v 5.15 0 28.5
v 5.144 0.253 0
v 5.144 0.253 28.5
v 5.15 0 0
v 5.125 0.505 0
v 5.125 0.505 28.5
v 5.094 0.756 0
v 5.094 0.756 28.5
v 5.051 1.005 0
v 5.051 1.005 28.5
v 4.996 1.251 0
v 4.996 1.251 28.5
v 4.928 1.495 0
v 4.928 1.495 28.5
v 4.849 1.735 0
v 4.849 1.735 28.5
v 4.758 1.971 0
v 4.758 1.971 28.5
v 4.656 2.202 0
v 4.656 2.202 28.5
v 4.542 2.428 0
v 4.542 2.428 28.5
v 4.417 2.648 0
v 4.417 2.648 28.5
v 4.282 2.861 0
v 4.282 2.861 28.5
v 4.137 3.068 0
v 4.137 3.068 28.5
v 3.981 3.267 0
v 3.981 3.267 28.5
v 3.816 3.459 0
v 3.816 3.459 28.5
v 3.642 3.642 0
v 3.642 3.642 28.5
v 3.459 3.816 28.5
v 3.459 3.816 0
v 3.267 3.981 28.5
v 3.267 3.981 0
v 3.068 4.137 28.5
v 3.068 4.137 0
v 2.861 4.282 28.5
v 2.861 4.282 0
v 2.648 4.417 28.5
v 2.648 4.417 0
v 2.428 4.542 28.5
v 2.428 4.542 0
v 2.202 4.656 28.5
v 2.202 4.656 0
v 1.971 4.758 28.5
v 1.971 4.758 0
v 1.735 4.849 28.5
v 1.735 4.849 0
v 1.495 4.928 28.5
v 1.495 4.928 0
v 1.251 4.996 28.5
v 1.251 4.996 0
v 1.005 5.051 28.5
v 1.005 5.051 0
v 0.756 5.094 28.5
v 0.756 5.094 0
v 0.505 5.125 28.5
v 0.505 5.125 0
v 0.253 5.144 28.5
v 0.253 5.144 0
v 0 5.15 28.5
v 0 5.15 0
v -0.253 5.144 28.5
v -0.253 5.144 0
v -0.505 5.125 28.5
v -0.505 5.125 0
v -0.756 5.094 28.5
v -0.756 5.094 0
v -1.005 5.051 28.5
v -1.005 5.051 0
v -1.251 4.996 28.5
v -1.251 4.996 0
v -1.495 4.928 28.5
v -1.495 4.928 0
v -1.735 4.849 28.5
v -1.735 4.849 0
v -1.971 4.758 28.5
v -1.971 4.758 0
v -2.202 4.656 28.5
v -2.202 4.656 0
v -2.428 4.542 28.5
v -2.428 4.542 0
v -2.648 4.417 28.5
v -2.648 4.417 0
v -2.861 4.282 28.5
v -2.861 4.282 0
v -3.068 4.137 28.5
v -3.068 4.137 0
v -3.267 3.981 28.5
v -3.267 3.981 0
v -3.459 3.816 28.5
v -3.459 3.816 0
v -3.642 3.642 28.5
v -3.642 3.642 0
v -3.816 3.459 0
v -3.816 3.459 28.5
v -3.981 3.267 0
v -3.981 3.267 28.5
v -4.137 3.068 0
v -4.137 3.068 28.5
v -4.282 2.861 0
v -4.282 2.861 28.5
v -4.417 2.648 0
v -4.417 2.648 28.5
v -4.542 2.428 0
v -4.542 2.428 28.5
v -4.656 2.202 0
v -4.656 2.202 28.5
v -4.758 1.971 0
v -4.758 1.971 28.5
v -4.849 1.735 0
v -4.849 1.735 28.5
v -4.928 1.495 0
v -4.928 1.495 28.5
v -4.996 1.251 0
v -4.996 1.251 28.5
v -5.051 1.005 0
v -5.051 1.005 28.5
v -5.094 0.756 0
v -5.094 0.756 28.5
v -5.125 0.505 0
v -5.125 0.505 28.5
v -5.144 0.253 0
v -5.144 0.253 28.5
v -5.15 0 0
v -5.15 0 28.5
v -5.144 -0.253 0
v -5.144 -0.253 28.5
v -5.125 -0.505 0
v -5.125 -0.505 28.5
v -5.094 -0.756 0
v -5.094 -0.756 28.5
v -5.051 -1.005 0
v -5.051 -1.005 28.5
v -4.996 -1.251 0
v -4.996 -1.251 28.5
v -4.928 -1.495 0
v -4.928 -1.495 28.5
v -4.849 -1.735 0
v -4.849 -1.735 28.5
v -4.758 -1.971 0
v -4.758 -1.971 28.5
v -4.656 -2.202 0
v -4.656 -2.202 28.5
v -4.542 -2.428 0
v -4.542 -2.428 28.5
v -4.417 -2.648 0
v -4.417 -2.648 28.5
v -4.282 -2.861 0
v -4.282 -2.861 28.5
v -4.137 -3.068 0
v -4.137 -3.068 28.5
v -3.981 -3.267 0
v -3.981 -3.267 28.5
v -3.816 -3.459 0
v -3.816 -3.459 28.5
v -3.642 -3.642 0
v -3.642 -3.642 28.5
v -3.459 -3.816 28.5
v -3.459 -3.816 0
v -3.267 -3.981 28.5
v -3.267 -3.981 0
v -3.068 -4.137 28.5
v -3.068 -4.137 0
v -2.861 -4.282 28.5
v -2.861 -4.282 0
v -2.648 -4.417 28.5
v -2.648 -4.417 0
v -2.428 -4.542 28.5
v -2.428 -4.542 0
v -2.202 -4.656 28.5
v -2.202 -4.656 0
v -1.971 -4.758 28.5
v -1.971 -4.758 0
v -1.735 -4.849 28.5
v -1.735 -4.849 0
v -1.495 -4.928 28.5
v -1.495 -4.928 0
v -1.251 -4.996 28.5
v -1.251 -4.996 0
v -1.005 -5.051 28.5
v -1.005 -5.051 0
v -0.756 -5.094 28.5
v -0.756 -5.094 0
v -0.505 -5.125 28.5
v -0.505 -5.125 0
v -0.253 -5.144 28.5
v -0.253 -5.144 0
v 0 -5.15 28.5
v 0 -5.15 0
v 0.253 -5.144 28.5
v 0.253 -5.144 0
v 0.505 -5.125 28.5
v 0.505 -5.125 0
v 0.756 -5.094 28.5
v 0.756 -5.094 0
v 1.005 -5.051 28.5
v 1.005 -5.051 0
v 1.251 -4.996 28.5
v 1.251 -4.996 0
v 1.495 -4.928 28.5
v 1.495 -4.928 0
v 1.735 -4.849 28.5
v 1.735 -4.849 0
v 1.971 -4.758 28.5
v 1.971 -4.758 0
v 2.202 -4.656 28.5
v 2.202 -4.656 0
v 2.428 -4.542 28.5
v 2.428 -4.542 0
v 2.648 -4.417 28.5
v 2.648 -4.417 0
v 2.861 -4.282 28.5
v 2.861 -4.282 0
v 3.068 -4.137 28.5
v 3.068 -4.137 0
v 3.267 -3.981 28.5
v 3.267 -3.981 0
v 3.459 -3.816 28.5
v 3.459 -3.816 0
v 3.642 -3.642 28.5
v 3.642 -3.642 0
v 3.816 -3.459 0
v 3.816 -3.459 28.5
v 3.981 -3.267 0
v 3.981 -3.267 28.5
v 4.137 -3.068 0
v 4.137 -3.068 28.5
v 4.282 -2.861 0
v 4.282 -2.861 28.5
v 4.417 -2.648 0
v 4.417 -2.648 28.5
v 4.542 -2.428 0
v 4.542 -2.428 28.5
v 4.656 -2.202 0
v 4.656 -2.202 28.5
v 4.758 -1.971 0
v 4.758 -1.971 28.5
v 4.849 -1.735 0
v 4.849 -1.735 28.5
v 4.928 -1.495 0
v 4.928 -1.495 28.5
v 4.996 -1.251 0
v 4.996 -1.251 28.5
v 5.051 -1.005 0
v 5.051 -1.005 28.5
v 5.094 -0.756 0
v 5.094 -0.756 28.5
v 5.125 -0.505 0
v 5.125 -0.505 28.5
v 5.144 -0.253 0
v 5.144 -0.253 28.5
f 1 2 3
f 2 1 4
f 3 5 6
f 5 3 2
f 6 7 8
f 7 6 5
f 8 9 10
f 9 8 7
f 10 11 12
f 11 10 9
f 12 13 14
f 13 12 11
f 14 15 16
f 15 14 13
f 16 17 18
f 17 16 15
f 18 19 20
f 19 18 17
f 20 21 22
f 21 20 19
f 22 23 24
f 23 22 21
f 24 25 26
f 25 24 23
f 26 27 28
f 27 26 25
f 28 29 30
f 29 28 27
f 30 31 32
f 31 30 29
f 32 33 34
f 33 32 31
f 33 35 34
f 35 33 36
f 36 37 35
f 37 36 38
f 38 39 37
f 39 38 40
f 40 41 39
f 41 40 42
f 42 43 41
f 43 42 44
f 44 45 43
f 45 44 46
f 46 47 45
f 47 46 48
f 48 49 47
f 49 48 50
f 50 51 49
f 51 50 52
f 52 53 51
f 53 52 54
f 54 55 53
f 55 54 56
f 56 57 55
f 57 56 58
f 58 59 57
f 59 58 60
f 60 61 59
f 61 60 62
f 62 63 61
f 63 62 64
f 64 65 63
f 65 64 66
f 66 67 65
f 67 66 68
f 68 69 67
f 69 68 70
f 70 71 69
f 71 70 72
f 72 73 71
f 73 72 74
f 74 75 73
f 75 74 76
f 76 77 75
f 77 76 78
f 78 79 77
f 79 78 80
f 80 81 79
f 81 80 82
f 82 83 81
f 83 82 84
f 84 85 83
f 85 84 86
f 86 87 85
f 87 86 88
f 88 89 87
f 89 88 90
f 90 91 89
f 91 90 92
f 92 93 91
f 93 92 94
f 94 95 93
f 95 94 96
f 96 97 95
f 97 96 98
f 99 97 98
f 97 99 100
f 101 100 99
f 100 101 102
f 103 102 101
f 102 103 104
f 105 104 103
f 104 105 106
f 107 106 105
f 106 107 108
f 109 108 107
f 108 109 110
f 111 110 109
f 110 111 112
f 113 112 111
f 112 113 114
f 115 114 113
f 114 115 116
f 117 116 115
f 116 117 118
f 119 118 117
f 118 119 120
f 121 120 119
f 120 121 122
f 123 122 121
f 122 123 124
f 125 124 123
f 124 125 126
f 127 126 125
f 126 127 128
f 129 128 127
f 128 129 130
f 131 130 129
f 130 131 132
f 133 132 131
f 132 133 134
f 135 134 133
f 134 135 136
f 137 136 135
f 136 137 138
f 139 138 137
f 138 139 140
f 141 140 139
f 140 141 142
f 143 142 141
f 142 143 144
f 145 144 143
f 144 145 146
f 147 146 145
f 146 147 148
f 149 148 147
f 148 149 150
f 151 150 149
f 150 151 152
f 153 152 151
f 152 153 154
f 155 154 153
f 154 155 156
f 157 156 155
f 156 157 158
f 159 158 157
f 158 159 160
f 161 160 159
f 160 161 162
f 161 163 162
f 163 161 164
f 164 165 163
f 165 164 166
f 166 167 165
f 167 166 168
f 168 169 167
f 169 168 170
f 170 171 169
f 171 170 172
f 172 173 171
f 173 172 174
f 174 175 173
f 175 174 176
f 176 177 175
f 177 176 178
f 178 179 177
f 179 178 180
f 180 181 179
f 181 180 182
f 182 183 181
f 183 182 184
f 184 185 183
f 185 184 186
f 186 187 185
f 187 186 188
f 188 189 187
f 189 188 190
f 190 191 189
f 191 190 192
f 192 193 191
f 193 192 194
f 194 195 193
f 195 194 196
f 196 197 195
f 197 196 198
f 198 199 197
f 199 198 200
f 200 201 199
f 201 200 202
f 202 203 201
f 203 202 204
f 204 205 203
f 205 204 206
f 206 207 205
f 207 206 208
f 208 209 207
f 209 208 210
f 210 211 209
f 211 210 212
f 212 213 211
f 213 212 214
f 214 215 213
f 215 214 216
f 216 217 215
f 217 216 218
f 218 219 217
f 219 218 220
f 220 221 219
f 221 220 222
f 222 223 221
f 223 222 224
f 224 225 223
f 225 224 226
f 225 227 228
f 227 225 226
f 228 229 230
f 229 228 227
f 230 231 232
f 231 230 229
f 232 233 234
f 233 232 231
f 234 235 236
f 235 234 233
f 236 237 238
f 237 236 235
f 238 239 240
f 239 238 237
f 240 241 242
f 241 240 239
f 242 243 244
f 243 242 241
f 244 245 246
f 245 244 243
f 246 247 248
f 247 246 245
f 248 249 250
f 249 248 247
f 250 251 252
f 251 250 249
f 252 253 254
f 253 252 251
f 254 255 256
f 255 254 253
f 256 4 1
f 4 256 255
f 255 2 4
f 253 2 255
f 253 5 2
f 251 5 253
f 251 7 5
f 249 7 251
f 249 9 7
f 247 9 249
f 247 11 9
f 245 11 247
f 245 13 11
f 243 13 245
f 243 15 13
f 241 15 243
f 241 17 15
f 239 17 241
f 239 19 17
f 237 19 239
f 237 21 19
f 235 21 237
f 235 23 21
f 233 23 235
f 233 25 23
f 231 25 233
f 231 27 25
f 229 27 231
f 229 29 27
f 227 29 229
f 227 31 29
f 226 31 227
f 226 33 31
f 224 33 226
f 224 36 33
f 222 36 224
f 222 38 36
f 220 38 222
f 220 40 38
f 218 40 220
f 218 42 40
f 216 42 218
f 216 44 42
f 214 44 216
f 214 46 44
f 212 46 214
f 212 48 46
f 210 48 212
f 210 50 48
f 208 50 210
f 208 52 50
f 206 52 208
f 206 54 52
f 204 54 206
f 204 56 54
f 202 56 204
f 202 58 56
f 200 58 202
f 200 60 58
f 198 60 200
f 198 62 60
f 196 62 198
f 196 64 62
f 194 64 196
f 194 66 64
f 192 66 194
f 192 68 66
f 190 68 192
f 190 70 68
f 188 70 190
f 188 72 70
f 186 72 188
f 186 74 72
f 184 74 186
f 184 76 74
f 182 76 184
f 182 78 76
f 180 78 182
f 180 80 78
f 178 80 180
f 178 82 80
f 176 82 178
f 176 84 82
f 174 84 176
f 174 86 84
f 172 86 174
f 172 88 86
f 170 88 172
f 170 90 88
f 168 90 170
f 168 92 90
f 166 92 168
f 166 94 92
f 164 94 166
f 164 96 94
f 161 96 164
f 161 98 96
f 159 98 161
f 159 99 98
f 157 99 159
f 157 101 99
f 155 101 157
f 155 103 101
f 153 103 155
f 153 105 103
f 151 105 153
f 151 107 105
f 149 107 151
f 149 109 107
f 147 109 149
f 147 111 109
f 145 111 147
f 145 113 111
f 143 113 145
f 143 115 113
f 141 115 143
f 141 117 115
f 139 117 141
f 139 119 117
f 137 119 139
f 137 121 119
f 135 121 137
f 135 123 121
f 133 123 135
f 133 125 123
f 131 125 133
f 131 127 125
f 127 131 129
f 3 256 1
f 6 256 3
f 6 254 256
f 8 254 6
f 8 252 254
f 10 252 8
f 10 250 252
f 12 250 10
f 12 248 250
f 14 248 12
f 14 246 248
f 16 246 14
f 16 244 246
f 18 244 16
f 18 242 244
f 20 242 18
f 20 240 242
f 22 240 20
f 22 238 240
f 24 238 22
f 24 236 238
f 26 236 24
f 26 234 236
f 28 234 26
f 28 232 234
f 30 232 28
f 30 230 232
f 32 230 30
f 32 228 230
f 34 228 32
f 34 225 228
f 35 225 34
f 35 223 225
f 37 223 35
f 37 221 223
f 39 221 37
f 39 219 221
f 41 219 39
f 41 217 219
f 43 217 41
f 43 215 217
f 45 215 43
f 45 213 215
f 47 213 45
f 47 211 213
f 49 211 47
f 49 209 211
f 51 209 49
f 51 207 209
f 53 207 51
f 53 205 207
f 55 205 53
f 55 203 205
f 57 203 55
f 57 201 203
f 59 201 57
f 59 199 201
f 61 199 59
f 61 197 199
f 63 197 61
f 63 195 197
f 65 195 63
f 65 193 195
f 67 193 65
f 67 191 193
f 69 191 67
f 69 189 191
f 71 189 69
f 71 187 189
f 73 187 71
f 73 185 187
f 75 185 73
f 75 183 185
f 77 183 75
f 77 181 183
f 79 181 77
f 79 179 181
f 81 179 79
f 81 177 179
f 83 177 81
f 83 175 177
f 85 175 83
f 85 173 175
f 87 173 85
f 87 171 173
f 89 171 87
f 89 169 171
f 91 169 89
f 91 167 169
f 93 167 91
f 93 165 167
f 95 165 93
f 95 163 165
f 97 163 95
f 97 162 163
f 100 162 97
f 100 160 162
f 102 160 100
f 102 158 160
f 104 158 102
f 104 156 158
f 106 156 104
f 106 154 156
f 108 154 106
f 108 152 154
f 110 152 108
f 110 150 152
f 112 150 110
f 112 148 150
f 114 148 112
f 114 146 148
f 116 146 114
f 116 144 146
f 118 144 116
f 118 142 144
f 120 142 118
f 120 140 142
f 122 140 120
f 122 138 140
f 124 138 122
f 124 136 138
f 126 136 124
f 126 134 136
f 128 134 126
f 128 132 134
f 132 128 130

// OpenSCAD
$fn = 128;

height = 28.5;      // mm
diameter = 10.3;    // mm

cylinder(h = height, d = diameter);
